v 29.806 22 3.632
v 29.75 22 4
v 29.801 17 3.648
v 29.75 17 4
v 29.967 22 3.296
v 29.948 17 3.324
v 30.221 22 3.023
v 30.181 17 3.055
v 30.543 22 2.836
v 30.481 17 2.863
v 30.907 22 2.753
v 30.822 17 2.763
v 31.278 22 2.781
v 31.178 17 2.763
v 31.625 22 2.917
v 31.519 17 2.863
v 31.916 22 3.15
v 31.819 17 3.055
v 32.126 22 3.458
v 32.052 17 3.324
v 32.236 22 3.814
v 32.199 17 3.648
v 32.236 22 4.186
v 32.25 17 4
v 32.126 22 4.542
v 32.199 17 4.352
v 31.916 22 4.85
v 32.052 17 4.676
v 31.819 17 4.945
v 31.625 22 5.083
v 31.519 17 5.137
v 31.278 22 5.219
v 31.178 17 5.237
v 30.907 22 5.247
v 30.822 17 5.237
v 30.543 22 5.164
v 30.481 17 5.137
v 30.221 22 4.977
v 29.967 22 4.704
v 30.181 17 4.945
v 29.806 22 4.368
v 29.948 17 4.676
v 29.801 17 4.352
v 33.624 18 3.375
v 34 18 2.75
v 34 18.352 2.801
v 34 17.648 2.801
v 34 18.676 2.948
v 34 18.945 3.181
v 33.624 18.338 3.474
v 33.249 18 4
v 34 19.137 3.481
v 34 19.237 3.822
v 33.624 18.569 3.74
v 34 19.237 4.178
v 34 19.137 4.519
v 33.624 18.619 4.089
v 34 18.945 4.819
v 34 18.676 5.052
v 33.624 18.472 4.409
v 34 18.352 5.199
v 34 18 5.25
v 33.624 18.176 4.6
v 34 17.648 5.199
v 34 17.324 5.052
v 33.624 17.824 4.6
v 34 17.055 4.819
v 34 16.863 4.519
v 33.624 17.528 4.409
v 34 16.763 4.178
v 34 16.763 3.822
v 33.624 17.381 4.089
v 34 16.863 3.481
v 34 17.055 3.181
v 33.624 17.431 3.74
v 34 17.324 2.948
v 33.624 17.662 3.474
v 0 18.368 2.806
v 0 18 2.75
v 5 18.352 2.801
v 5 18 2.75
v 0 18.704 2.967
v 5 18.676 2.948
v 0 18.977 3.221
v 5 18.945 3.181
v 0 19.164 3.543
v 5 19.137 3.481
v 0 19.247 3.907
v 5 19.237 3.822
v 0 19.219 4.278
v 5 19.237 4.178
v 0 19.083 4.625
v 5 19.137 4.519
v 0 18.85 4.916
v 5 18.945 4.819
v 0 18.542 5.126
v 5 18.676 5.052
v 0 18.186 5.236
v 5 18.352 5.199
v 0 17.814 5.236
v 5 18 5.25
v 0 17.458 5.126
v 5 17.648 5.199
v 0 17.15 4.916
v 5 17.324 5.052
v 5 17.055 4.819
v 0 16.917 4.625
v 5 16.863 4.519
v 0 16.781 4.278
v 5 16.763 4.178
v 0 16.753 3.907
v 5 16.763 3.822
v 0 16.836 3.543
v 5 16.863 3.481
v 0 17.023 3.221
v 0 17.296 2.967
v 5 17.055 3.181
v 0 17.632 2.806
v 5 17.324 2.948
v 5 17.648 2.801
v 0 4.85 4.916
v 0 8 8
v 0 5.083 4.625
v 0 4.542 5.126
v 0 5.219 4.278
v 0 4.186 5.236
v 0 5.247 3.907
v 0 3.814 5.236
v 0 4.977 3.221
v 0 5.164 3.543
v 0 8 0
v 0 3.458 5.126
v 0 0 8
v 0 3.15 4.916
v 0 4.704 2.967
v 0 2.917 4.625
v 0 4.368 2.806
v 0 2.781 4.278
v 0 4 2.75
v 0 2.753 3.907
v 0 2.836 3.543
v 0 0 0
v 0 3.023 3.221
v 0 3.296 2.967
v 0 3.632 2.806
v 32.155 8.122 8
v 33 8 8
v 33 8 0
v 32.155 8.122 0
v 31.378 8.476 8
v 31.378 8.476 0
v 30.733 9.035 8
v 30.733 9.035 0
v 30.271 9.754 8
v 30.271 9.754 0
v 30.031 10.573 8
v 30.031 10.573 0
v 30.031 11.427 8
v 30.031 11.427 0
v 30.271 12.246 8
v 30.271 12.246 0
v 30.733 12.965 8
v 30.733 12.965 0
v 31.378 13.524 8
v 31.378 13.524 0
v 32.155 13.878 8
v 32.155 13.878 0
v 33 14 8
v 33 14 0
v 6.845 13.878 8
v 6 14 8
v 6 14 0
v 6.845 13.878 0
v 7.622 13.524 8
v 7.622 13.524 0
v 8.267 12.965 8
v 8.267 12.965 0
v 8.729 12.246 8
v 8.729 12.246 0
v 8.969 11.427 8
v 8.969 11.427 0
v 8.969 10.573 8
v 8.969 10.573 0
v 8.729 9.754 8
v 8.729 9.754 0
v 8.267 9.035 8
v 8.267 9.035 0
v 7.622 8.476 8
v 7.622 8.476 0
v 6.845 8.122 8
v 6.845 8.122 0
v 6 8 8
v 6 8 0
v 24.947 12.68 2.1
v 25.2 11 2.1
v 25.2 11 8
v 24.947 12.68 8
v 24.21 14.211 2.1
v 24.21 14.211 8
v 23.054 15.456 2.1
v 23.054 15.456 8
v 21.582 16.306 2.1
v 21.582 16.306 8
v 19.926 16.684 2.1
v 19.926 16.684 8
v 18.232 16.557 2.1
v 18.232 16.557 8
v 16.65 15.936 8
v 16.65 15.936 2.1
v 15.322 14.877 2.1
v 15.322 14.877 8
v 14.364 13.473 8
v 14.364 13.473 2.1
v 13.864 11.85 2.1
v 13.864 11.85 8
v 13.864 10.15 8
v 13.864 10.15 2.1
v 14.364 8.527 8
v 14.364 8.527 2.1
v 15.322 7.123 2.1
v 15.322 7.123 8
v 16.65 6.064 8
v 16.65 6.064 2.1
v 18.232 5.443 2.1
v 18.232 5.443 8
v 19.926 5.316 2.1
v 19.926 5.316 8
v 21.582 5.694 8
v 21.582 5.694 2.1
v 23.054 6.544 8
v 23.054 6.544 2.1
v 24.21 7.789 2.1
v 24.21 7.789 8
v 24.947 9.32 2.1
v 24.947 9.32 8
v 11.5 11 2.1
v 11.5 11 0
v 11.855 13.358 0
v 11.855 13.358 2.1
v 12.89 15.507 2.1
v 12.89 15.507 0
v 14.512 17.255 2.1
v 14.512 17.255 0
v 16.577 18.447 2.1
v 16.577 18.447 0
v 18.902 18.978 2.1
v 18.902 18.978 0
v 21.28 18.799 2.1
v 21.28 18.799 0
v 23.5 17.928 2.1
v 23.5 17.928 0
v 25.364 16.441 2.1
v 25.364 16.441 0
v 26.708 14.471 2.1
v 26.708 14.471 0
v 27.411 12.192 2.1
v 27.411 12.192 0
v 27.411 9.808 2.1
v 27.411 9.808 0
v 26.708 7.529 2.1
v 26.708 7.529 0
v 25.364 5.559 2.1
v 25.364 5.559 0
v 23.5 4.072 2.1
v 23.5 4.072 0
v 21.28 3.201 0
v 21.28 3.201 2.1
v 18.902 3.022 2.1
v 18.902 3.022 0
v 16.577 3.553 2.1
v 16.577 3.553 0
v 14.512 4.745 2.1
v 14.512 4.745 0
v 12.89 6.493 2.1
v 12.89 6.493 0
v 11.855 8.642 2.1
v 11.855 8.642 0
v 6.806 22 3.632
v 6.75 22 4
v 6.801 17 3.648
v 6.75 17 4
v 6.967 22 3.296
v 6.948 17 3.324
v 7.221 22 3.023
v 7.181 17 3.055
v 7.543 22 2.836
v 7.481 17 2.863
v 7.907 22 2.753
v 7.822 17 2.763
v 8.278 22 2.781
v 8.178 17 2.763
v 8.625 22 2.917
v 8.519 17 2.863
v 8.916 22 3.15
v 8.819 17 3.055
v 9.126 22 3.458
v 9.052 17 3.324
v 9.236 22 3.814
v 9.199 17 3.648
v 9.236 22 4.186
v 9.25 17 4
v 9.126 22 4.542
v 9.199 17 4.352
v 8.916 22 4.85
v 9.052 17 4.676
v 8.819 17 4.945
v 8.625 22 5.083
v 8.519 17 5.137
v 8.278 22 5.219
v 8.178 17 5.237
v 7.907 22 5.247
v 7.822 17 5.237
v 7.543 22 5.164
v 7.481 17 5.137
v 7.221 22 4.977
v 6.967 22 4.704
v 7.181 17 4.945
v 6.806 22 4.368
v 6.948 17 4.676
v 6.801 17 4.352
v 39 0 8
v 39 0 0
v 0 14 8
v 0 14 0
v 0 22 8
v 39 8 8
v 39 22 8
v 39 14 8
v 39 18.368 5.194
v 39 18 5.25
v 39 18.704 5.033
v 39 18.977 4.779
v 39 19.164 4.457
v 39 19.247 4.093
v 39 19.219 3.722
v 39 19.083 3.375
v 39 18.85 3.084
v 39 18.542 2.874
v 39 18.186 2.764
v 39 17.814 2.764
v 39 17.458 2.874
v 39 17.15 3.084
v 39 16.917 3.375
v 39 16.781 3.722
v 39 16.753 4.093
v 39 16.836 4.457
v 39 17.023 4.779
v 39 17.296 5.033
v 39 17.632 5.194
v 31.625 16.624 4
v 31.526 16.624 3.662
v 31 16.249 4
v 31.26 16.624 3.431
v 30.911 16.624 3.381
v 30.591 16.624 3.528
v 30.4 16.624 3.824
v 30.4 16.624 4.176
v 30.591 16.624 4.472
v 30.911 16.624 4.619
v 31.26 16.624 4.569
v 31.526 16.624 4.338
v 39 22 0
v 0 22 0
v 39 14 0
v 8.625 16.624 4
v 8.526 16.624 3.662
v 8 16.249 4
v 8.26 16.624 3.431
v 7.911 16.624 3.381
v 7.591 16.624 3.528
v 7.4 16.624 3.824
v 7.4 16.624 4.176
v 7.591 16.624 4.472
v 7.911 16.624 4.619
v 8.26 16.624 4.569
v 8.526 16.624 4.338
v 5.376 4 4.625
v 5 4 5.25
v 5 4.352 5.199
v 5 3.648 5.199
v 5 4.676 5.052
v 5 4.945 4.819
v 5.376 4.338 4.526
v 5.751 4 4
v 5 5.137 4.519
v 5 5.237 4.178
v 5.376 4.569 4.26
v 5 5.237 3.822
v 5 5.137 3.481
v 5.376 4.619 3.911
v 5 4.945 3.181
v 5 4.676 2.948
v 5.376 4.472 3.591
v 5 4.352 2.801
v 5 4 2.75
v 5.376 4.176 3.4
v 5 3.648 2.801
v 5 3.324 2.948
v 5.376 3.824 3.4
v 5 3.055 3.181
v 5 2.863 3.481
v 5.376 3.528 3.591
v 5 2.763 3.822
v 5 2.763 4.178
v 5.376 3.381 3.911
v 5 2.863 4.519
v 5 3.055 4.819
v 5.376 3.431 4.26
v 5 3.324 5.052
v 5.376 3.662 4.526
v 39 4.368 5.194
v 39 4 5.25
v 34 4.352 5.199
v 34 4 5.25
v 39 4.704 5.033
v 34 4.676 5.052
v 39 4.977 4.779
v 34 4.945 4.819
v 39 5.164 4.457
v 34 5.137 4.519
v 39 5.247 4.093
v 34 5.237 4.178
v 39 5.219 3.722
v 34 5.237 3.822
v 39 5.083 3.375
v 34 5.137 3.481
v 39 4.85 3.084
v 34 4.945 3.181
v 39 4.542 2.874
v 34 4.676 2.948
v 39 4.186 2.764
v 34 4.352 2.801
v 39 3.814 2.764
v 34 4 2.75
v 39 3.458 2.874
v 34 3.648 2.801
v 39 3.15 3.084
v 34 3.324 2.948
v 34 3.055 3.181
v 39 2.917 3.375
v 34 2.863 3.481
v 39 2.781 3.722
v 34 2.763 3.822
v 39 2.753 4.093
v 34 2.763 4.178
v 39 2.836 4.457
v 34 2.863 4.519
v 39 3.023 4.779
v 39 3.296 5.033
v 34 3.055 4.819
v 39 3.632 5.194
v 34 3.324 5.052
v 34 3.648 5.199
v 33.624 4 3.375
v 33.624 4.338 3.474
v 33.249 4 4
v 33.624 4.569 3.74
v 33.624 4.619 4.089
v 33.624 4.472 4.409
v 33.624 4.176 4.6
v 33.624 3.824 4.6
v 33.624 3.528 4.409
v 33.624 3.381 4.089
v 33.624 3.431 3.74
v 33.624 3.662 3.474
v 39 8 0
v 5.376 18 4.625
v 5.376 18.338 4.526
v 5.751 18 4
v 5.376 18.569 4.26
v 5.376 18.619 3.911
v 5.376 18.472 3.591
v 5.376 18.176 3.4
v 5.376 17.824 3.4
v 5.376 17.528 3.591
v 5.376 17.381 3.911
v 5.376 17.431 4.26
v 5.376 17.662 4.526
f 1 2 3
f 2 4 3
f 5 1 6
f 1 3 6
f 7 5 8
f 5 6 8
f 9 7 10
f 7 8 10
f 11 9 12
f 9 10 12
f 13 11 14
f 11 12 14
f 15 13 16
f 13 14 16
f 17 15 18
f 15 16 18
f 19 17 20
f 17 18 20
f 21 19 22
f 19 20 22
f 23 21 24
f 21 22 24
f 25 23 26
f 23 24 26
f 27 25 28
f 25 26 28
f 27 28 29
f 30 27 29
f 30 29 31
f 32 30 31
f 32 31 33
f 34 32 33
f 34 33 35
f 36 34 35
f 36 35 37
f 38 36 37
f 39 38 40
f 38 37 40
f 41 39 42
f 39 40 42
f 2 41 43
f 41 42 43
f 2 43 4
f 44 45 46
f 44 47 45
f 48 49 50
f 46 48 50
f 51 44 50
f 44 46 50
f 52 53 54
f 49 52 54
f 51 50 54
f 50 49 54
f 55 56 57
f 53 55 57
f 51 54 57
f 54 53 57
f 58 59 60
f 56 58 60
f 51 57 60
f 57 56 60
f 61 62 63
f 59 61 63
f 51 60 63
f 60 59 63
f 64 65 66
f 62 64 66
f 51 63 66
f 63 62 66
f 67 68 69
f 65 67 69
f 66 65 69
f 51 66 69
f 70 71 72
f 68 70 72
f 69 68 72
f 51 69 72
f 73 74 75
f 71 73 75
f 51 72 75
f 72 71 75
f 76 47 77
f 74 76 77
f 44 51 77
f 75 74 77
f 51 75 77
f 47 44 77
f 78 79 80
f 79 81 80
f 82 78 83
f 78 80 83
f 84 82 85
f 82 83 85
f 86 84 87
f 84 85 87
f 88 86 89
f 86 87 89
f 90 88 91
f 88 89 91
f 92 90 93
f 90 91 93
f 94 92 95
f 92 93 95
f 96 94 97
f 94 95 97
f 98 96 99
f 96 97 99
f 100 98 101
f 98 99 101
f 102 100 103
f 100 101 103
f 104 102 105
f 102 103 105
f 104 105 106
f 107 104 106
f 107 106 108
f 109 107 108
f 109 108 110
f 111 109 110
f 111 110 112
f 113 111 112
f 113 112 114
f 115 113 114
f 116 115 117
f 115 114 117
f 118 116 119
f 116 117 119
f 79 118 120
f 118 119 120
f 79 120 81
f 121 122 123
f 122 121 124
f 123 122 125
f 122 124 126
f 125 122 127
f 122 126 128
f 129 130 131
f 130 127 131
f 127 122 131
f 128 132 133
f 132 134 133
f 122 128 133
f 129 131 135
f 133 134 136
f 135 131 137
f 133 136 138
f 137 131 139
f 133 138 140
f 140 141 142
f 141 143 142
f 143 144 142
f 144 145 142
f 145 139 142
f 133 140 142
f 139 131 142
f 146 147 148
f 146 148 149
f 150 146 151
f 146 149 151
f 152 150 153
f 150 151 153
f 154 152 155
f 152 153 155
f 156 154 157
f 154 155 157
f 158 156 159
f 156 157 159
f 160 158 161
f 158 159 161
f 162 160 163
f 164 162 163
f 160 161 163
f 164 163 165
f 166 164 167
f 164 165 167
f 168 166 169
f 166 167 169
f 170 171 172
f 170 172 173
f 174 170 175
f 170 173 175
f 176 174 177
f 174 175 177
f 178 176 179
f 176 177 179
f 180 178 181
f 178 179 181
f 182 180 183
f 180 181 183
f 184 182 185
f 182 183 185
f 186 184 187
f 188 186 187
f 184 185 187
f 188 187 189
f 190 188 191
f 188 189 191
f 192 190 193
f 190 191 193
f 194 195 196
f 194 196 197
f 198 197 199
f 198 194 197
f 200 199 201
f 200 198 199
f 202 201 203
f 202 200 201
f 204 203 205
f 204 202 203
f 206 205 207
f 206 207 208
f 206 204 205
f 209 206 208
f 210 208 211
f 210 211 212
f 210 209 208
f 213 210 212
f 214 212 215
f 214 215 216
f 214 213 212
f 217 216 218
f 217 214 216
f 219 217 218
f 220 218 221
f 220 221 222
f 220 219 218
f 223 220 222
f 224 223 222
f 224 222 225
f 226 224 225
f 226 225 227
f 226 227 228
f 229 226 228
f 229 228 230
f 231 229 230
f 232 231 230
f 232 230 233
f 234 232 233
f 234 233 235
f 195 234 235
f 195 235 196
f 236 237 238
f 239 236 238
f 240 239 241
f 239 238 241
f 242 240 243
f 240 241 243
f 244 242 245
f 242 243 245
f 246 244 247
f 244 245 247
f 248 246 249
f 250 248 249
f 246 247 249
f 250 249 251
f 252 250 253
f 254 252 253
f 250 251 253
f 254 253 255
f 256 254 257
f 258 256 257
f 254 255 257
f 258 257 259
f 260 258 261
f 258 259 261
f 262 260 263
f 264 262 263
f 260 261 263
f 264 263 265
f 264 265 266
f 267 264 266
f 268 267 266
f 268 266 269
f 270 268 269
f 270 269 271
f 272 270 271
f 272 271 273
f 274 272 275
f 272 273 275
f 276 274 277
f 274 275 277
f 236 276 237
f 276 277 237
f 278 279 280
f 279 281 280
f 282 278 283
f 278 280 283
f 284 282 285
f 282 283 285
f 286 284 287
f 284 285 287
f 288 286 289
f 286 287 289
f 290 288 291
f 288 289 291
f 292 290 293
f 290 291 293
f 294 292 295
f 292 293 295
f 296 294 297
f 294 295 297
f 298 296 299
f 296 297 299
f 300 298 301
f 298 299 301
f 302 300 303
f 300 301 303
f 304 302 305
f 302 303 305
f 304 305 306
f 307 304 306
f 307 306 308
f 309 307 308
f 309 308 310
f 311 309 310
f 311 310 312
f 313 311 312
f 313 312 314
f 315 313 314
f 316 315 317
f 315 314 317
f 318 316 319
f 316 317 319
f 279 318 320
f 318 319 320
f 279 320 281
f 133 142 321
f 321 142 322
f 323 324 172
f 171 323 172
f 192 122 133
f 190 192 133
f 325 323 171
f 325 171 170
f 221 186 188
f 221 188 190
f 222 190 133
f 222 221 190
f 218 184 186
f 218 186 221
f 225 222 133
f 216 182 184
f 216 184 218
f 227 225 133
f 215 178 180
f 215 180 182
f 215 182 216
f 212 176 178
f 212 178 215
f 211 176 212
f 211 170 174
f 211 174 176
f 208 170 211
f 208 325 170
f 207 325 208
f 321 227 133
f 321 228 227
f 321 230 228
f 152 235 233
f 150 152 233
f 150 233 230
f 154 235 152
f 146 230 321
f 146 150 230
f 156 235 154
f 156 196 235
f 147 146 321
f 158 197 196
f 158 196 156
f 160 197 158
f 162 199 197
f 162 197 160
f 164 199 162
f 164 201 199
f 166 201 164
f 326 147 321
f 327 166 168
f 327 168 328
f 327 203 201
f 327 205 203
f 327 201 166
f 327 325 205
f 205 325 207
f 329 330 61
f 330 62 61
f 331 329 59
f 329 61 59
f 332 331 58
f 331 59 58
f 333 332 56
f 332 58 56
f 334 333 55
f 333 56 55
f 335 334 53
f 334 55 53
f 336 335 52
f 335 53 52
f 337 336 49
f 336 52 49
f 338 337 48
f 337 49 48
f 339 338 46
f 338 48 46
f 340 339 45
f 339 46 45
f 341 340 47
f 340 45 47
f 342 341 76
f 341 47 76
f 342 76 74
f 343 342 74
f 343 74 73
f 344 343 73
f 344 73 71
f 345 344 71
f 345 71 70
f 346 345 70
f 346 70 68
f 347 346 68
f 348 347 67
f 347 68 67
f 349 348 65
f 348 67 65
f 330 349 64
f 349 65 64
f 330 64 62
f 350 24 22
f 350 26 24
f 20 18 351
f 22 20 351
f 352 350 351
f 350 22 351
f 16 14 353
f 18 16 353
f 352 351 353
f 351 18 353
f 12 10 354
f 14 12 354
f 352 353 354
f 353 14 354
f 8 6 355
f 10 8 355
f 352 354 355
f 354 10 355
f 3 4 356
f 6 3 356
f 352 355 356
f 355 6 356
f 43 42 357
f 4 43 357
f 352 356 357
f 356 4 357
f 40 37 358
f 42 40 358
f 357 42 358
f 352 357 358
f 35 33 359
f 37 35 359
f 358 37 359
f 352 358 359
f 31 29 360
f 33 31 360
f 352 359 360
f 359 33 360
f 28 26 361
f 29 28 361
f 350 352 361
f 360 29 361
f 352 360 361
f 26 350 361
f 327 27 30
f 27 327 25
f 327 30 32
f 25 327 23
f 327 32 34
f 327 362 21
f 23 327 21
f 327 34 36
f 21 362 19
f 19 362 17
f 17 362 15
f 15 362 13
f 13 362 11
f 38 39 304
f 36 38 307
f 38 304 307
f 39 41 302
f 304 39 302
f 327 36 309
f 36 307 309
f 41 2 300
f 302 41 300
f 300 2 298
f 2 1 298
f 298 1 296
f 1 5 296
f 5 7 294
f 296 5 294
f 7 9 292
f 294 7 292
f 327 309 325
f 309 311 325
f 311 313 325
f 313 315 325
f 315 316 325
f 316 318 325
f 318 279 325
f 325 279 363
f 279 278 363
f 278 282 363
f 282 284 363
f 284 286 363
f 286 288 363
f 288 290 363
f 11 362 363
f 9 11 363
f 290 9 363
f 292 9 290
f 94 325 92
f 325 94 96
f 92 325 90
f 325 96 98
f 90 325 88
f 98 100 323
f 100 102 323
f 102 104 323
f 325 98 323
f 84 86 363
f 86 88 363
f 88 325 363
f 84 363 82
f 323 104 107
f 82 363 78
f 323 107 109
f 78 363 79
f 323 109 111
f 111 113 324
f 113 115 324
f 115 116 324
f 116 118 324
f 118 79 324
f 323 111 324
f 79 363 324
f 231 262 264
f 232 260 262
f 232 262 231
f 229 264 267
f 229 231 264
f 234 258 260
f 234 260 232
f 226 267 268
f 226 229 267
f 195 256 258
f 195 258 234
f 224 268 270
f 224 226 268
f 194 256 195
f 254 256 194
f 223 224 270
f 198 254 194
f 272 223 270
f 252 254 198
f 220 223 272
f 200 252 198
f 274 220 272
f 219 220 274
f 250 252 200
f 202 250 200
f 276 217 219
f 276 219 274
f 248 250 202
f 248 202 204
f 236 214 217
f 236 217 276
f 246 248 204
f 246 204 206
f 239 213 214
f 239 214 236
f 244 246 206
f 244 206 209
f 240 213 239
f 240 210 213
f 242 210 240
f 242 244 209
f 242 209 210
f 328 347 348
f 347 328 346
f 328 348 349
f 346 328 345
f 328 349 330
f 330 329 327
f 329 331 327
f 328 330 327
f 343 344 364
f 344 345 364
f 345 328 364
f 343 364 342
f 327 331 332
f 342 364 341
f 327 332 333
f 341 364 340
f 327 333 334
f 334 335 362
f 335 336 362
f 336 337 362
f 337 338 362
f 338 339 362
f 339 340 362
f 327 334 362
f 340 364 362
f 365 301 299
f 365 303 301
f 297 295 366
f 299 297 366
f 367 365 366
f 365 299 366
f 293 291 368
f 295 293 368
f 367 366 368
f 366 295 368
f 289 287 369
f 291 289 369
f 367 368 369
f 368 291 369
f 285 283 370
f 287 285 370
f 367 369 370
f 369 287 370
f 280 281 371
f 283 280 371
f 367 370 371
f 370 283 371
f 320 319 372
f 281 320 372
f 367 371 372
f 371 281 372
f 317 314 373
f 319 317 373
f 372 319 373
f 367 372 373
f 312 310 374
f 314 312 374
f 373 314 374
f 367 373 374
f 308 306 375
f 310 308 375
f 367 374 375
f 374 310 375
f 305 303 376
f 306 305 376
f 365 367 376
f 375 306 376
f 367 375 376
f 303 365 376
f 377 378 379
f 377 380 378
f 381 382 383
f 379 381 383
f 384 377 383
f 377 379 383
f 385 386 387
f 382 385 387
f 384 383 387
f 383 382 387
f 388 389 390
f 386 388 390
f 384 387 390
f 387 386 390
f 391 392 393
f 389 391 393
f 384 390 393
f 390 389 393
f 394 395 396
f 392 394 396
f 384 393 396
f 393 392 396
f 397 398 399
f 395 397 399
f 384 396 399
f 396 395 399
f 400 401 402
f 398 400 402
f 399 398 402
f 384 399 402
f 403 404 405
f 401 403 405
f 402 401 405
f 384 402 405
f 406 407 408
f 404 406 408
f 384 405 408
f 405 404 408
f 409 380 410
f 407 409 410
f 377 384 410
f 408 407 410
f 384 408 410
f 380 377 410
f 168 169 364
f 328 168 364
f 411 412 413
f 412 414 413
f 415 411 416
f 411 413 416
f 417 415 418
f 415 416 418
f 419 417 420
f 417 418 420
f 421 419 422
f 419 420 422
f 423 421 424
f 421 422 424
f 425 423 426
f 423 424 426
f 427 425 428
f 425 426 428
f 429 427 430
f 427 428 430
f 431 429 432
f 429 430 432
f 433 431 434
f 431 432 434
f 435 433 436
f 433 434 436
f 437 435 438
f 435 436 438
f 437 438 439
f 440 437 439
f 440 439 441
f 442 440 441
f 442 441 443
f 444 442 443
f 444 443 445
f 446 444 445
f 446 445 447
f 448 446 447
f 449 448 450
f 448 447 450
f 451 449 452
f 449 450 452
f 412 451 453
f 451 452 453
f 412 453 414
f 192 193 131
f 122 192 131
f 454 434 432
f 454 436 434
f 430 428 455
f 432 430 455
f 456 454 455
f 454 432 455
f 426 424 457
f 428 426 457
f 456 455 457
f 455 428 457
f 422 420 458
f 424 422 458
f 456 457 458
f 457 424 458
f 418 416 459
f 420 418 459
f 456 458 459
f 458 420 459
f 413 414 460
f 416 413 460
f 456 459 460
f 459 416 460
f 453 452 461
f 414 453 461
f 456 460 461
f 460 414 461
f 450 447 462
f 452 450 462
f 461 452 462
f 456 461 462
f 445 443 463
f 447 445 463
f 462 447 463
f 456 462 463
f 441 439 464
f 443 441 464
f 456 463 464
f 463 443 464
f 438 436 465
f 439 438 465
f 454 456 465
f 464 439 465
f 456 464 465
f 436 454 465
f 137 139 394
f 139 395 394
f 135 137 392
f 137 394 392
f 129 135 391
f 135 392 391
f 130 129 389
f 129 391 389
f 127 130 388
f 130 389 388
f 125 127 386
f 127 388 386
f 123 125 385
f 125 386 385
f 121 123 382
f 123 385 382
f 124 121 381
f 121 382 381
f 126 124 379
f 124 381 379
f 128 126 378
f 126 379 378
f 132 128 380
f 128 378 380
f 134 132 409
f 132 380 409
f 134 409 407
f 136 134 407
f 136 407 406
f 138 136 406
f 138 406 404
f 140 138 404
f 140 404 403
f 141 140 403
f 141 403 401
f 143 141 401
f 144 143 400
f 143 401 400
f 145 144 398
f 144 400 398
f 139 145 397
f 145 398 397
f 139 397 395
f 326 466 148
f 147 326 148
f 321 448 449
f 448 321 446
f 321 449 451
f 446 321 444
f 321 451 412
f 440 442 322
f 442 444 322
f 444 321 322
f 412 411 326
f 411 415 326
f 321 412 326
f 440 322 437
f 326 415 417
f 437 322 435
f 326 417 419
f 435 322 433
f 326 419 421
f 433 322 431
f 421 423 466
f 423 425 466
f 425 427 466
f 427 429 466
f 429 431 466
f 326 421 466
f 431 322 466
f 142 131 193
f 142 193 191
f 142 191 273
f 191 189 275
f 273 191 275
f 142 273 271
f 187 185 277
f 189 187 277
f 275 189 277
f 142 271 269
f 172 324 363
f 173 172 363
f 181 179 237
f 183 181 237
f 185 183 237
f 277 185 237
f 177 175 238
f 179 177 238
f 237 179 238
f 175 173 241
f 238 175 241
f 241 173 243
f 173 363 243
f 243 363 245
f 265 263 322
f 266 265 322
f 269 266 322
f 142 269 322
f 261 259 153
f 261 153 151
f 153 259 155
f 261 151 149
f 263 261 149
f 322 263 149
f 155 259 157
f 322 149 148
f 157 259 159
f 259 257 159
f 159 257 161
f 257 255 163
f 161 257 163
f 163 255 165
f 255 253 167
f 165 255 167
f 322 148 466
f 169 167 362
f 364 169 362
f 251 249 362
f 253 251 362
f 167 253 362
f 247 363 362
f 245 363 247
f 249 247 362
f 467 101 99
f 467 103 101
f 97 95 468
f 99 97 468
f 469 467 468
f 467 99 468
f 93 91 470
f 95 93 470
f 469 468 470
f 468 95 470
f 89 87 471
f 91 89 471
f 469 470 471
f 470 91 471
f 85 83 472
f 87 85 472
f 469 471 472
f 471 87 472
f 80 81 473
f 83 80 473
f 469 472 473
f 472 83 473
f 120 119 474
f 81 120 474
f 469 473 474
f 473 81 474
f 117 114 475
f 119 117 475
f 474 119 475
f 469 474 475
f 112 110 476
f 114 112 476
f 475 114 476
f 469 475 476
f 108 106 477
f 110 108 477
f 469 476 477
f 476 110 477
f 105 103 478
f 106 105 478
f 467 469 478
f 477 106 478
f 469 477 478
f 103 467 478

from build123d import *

# Parameters (mm, degrees)
SKETCH1_R                       = 5.7
BOSS_EXTRUDE1_DEPTH             = 8
TAP_DRILL_FOR_M3X0_5_TAP1_D     = 2.5
TAP_DRILL_FOR_M3X0_5_TAP1_DEPTH = 5
TAP_DRILL_FOR_M3X0_5_TAP1_TIP   = 0.751075774
TAP_DRILL_FOR_M3X0_5_TAP2_D     = 2.5
TAP_DRILL_FOR_M3X0_5_TAP2_DEPTH = 5
TAP_DRILL_FOR_M3X0_5_TAP2_TIP   = 0.751075774
TAP_DRILL_FOR_M3X0_5_TAP3_D     = 2.5
TAP_DRILL_FOR_M3X0_5_TAP3_DEPTH = 5
TAP_DRILL_FOR_M3X0_5_TAP3_TIP   = 0.751075774
SKETCH8_R                       = 8
CUT_EXTRUDE1_DEPTH              = 2.1


with BuildPart() as part:
    # Sketch1 → Boss-Extrude1 (new body)
    with BuildSketch(Plane.XY):
        with BuildLine():
            Line((0, 0), (39, 0))
            Line((39, 0), (39, 8))
            Line((39, 8), (33, 8))
            ThreePointArc((33, 8), (30, 11), (33, 14))
            Line((33, 14), (39, 14))
            Line((39, 14), (39, 22))
            Line((39, 22), (0, 22))
            Line((0, 22), (0, 14))
            Line((0, 14), (6, 14))
            ThreePointArc((6, 14), (9, 11), (6, 8))
            Line((6, 8), (0, 8))
            Line((0, 8), (0, 0))
        make_face()
        with Locations((19.5, 11)):
            Circle(SKETCH1_R, mode=Mode.SUBTRACT)
    extrude(amount=BOSS_EXTRUDE1_DEPTH)

    # Tap Drill for M3x0.5 Tap1
    with Locations(Plane(origin=(39, 0, 0), x_dir=(0, 0, -1), z_dir=(1, 0, 0))):
        with Locations((-4, 18), (-4, 4)):
            Hole(TAP_DRILL_FOR_M3X0_5_TAP1_D / 2, depth=TAP_DRILL_FOR_M3X0_5_TAP1_DEPTH)
            with Locations((0, 0, -(TAP_DRILL_FOR_M3X0_5_TAP1_DEPTH + TAP_DRILL_FOR_M3X0_5_TAP1_TIP / 2))):  # 118° drill point
                Cone(0, TAP_DRILL_FOR_M3X0_5_TAP1_D / 2, TAP_DRILL_FOR_M3X0_5_TAP1_TIP, mode=Mode.SUBTRACT)

    # Tap Drill for M3x0.5 Tap2
    with Locations(Plane.ZY):
        with Locations((4, 4), (4, 18)):
            Hole(TAP_DRILL_FOR_M3X0_5_TAP2_D / 2, depth=TAP_DRILL_FOR_M3X0_5_TAP2_DEPTH)
            with Locations((0, 0, -(TAP_DRILL_FOR_M3X0_5_TAP2_DEPTH + TAP_DRILL_FOR_M3X0_5_TAP2_TIP / 2))):  # 118° drill point
                Cone(0, TAP_DRILL_FOR_M3X0_5_TAP2_D / 2, TAP_DRILL_FOR_M3X0_5_TAP2_TIP, mode=Mode.SUBTRACT)

    # Tap Drill for M3x0.5 Tap3
    with Locations(Plane(origin=(0, 22, 0), x_dir=(1, 0, 0), z_dir=(0, 1, 0))):
        with Locations((31, -4), (8, -4)):
            Hole(TAP_DRILL_FOR_M3X0_5_TAP3_D / 2, depth=TAP_DRILL_FOR_M3X0_5_TAP3_DEPTH)
            with Locations((0, 0, -(TAP_DRILL_FOR_M3X0_5_TAP3_DEPTH + TAP_DRILL_FOR_M3X0_5_TAP3_TIP / 2))):  # 118° drill point
                Cone(0, TAP_DRILL_FOR_M3X0_5_TAP3_D / 2, TAP_DRILL_FOR_M3X0_5_TAP3_TIP, mode=Mode.SUBTRACT)

    # Sketch8 → Cut-Extrude1 (cut)
    with BuildSketch(Plane(origin=(0, 0, 0), x_dir=(-1, 0, 0), z_dir=(0, 0, -1))):
        with Locations((-19.5, 11)):
            Circle(SKETCH8_R)
    extrude(amount=-CUT_EXTRUDE1_DEPTH, mode=Mode.SUBTRACT)


solid = part.part
